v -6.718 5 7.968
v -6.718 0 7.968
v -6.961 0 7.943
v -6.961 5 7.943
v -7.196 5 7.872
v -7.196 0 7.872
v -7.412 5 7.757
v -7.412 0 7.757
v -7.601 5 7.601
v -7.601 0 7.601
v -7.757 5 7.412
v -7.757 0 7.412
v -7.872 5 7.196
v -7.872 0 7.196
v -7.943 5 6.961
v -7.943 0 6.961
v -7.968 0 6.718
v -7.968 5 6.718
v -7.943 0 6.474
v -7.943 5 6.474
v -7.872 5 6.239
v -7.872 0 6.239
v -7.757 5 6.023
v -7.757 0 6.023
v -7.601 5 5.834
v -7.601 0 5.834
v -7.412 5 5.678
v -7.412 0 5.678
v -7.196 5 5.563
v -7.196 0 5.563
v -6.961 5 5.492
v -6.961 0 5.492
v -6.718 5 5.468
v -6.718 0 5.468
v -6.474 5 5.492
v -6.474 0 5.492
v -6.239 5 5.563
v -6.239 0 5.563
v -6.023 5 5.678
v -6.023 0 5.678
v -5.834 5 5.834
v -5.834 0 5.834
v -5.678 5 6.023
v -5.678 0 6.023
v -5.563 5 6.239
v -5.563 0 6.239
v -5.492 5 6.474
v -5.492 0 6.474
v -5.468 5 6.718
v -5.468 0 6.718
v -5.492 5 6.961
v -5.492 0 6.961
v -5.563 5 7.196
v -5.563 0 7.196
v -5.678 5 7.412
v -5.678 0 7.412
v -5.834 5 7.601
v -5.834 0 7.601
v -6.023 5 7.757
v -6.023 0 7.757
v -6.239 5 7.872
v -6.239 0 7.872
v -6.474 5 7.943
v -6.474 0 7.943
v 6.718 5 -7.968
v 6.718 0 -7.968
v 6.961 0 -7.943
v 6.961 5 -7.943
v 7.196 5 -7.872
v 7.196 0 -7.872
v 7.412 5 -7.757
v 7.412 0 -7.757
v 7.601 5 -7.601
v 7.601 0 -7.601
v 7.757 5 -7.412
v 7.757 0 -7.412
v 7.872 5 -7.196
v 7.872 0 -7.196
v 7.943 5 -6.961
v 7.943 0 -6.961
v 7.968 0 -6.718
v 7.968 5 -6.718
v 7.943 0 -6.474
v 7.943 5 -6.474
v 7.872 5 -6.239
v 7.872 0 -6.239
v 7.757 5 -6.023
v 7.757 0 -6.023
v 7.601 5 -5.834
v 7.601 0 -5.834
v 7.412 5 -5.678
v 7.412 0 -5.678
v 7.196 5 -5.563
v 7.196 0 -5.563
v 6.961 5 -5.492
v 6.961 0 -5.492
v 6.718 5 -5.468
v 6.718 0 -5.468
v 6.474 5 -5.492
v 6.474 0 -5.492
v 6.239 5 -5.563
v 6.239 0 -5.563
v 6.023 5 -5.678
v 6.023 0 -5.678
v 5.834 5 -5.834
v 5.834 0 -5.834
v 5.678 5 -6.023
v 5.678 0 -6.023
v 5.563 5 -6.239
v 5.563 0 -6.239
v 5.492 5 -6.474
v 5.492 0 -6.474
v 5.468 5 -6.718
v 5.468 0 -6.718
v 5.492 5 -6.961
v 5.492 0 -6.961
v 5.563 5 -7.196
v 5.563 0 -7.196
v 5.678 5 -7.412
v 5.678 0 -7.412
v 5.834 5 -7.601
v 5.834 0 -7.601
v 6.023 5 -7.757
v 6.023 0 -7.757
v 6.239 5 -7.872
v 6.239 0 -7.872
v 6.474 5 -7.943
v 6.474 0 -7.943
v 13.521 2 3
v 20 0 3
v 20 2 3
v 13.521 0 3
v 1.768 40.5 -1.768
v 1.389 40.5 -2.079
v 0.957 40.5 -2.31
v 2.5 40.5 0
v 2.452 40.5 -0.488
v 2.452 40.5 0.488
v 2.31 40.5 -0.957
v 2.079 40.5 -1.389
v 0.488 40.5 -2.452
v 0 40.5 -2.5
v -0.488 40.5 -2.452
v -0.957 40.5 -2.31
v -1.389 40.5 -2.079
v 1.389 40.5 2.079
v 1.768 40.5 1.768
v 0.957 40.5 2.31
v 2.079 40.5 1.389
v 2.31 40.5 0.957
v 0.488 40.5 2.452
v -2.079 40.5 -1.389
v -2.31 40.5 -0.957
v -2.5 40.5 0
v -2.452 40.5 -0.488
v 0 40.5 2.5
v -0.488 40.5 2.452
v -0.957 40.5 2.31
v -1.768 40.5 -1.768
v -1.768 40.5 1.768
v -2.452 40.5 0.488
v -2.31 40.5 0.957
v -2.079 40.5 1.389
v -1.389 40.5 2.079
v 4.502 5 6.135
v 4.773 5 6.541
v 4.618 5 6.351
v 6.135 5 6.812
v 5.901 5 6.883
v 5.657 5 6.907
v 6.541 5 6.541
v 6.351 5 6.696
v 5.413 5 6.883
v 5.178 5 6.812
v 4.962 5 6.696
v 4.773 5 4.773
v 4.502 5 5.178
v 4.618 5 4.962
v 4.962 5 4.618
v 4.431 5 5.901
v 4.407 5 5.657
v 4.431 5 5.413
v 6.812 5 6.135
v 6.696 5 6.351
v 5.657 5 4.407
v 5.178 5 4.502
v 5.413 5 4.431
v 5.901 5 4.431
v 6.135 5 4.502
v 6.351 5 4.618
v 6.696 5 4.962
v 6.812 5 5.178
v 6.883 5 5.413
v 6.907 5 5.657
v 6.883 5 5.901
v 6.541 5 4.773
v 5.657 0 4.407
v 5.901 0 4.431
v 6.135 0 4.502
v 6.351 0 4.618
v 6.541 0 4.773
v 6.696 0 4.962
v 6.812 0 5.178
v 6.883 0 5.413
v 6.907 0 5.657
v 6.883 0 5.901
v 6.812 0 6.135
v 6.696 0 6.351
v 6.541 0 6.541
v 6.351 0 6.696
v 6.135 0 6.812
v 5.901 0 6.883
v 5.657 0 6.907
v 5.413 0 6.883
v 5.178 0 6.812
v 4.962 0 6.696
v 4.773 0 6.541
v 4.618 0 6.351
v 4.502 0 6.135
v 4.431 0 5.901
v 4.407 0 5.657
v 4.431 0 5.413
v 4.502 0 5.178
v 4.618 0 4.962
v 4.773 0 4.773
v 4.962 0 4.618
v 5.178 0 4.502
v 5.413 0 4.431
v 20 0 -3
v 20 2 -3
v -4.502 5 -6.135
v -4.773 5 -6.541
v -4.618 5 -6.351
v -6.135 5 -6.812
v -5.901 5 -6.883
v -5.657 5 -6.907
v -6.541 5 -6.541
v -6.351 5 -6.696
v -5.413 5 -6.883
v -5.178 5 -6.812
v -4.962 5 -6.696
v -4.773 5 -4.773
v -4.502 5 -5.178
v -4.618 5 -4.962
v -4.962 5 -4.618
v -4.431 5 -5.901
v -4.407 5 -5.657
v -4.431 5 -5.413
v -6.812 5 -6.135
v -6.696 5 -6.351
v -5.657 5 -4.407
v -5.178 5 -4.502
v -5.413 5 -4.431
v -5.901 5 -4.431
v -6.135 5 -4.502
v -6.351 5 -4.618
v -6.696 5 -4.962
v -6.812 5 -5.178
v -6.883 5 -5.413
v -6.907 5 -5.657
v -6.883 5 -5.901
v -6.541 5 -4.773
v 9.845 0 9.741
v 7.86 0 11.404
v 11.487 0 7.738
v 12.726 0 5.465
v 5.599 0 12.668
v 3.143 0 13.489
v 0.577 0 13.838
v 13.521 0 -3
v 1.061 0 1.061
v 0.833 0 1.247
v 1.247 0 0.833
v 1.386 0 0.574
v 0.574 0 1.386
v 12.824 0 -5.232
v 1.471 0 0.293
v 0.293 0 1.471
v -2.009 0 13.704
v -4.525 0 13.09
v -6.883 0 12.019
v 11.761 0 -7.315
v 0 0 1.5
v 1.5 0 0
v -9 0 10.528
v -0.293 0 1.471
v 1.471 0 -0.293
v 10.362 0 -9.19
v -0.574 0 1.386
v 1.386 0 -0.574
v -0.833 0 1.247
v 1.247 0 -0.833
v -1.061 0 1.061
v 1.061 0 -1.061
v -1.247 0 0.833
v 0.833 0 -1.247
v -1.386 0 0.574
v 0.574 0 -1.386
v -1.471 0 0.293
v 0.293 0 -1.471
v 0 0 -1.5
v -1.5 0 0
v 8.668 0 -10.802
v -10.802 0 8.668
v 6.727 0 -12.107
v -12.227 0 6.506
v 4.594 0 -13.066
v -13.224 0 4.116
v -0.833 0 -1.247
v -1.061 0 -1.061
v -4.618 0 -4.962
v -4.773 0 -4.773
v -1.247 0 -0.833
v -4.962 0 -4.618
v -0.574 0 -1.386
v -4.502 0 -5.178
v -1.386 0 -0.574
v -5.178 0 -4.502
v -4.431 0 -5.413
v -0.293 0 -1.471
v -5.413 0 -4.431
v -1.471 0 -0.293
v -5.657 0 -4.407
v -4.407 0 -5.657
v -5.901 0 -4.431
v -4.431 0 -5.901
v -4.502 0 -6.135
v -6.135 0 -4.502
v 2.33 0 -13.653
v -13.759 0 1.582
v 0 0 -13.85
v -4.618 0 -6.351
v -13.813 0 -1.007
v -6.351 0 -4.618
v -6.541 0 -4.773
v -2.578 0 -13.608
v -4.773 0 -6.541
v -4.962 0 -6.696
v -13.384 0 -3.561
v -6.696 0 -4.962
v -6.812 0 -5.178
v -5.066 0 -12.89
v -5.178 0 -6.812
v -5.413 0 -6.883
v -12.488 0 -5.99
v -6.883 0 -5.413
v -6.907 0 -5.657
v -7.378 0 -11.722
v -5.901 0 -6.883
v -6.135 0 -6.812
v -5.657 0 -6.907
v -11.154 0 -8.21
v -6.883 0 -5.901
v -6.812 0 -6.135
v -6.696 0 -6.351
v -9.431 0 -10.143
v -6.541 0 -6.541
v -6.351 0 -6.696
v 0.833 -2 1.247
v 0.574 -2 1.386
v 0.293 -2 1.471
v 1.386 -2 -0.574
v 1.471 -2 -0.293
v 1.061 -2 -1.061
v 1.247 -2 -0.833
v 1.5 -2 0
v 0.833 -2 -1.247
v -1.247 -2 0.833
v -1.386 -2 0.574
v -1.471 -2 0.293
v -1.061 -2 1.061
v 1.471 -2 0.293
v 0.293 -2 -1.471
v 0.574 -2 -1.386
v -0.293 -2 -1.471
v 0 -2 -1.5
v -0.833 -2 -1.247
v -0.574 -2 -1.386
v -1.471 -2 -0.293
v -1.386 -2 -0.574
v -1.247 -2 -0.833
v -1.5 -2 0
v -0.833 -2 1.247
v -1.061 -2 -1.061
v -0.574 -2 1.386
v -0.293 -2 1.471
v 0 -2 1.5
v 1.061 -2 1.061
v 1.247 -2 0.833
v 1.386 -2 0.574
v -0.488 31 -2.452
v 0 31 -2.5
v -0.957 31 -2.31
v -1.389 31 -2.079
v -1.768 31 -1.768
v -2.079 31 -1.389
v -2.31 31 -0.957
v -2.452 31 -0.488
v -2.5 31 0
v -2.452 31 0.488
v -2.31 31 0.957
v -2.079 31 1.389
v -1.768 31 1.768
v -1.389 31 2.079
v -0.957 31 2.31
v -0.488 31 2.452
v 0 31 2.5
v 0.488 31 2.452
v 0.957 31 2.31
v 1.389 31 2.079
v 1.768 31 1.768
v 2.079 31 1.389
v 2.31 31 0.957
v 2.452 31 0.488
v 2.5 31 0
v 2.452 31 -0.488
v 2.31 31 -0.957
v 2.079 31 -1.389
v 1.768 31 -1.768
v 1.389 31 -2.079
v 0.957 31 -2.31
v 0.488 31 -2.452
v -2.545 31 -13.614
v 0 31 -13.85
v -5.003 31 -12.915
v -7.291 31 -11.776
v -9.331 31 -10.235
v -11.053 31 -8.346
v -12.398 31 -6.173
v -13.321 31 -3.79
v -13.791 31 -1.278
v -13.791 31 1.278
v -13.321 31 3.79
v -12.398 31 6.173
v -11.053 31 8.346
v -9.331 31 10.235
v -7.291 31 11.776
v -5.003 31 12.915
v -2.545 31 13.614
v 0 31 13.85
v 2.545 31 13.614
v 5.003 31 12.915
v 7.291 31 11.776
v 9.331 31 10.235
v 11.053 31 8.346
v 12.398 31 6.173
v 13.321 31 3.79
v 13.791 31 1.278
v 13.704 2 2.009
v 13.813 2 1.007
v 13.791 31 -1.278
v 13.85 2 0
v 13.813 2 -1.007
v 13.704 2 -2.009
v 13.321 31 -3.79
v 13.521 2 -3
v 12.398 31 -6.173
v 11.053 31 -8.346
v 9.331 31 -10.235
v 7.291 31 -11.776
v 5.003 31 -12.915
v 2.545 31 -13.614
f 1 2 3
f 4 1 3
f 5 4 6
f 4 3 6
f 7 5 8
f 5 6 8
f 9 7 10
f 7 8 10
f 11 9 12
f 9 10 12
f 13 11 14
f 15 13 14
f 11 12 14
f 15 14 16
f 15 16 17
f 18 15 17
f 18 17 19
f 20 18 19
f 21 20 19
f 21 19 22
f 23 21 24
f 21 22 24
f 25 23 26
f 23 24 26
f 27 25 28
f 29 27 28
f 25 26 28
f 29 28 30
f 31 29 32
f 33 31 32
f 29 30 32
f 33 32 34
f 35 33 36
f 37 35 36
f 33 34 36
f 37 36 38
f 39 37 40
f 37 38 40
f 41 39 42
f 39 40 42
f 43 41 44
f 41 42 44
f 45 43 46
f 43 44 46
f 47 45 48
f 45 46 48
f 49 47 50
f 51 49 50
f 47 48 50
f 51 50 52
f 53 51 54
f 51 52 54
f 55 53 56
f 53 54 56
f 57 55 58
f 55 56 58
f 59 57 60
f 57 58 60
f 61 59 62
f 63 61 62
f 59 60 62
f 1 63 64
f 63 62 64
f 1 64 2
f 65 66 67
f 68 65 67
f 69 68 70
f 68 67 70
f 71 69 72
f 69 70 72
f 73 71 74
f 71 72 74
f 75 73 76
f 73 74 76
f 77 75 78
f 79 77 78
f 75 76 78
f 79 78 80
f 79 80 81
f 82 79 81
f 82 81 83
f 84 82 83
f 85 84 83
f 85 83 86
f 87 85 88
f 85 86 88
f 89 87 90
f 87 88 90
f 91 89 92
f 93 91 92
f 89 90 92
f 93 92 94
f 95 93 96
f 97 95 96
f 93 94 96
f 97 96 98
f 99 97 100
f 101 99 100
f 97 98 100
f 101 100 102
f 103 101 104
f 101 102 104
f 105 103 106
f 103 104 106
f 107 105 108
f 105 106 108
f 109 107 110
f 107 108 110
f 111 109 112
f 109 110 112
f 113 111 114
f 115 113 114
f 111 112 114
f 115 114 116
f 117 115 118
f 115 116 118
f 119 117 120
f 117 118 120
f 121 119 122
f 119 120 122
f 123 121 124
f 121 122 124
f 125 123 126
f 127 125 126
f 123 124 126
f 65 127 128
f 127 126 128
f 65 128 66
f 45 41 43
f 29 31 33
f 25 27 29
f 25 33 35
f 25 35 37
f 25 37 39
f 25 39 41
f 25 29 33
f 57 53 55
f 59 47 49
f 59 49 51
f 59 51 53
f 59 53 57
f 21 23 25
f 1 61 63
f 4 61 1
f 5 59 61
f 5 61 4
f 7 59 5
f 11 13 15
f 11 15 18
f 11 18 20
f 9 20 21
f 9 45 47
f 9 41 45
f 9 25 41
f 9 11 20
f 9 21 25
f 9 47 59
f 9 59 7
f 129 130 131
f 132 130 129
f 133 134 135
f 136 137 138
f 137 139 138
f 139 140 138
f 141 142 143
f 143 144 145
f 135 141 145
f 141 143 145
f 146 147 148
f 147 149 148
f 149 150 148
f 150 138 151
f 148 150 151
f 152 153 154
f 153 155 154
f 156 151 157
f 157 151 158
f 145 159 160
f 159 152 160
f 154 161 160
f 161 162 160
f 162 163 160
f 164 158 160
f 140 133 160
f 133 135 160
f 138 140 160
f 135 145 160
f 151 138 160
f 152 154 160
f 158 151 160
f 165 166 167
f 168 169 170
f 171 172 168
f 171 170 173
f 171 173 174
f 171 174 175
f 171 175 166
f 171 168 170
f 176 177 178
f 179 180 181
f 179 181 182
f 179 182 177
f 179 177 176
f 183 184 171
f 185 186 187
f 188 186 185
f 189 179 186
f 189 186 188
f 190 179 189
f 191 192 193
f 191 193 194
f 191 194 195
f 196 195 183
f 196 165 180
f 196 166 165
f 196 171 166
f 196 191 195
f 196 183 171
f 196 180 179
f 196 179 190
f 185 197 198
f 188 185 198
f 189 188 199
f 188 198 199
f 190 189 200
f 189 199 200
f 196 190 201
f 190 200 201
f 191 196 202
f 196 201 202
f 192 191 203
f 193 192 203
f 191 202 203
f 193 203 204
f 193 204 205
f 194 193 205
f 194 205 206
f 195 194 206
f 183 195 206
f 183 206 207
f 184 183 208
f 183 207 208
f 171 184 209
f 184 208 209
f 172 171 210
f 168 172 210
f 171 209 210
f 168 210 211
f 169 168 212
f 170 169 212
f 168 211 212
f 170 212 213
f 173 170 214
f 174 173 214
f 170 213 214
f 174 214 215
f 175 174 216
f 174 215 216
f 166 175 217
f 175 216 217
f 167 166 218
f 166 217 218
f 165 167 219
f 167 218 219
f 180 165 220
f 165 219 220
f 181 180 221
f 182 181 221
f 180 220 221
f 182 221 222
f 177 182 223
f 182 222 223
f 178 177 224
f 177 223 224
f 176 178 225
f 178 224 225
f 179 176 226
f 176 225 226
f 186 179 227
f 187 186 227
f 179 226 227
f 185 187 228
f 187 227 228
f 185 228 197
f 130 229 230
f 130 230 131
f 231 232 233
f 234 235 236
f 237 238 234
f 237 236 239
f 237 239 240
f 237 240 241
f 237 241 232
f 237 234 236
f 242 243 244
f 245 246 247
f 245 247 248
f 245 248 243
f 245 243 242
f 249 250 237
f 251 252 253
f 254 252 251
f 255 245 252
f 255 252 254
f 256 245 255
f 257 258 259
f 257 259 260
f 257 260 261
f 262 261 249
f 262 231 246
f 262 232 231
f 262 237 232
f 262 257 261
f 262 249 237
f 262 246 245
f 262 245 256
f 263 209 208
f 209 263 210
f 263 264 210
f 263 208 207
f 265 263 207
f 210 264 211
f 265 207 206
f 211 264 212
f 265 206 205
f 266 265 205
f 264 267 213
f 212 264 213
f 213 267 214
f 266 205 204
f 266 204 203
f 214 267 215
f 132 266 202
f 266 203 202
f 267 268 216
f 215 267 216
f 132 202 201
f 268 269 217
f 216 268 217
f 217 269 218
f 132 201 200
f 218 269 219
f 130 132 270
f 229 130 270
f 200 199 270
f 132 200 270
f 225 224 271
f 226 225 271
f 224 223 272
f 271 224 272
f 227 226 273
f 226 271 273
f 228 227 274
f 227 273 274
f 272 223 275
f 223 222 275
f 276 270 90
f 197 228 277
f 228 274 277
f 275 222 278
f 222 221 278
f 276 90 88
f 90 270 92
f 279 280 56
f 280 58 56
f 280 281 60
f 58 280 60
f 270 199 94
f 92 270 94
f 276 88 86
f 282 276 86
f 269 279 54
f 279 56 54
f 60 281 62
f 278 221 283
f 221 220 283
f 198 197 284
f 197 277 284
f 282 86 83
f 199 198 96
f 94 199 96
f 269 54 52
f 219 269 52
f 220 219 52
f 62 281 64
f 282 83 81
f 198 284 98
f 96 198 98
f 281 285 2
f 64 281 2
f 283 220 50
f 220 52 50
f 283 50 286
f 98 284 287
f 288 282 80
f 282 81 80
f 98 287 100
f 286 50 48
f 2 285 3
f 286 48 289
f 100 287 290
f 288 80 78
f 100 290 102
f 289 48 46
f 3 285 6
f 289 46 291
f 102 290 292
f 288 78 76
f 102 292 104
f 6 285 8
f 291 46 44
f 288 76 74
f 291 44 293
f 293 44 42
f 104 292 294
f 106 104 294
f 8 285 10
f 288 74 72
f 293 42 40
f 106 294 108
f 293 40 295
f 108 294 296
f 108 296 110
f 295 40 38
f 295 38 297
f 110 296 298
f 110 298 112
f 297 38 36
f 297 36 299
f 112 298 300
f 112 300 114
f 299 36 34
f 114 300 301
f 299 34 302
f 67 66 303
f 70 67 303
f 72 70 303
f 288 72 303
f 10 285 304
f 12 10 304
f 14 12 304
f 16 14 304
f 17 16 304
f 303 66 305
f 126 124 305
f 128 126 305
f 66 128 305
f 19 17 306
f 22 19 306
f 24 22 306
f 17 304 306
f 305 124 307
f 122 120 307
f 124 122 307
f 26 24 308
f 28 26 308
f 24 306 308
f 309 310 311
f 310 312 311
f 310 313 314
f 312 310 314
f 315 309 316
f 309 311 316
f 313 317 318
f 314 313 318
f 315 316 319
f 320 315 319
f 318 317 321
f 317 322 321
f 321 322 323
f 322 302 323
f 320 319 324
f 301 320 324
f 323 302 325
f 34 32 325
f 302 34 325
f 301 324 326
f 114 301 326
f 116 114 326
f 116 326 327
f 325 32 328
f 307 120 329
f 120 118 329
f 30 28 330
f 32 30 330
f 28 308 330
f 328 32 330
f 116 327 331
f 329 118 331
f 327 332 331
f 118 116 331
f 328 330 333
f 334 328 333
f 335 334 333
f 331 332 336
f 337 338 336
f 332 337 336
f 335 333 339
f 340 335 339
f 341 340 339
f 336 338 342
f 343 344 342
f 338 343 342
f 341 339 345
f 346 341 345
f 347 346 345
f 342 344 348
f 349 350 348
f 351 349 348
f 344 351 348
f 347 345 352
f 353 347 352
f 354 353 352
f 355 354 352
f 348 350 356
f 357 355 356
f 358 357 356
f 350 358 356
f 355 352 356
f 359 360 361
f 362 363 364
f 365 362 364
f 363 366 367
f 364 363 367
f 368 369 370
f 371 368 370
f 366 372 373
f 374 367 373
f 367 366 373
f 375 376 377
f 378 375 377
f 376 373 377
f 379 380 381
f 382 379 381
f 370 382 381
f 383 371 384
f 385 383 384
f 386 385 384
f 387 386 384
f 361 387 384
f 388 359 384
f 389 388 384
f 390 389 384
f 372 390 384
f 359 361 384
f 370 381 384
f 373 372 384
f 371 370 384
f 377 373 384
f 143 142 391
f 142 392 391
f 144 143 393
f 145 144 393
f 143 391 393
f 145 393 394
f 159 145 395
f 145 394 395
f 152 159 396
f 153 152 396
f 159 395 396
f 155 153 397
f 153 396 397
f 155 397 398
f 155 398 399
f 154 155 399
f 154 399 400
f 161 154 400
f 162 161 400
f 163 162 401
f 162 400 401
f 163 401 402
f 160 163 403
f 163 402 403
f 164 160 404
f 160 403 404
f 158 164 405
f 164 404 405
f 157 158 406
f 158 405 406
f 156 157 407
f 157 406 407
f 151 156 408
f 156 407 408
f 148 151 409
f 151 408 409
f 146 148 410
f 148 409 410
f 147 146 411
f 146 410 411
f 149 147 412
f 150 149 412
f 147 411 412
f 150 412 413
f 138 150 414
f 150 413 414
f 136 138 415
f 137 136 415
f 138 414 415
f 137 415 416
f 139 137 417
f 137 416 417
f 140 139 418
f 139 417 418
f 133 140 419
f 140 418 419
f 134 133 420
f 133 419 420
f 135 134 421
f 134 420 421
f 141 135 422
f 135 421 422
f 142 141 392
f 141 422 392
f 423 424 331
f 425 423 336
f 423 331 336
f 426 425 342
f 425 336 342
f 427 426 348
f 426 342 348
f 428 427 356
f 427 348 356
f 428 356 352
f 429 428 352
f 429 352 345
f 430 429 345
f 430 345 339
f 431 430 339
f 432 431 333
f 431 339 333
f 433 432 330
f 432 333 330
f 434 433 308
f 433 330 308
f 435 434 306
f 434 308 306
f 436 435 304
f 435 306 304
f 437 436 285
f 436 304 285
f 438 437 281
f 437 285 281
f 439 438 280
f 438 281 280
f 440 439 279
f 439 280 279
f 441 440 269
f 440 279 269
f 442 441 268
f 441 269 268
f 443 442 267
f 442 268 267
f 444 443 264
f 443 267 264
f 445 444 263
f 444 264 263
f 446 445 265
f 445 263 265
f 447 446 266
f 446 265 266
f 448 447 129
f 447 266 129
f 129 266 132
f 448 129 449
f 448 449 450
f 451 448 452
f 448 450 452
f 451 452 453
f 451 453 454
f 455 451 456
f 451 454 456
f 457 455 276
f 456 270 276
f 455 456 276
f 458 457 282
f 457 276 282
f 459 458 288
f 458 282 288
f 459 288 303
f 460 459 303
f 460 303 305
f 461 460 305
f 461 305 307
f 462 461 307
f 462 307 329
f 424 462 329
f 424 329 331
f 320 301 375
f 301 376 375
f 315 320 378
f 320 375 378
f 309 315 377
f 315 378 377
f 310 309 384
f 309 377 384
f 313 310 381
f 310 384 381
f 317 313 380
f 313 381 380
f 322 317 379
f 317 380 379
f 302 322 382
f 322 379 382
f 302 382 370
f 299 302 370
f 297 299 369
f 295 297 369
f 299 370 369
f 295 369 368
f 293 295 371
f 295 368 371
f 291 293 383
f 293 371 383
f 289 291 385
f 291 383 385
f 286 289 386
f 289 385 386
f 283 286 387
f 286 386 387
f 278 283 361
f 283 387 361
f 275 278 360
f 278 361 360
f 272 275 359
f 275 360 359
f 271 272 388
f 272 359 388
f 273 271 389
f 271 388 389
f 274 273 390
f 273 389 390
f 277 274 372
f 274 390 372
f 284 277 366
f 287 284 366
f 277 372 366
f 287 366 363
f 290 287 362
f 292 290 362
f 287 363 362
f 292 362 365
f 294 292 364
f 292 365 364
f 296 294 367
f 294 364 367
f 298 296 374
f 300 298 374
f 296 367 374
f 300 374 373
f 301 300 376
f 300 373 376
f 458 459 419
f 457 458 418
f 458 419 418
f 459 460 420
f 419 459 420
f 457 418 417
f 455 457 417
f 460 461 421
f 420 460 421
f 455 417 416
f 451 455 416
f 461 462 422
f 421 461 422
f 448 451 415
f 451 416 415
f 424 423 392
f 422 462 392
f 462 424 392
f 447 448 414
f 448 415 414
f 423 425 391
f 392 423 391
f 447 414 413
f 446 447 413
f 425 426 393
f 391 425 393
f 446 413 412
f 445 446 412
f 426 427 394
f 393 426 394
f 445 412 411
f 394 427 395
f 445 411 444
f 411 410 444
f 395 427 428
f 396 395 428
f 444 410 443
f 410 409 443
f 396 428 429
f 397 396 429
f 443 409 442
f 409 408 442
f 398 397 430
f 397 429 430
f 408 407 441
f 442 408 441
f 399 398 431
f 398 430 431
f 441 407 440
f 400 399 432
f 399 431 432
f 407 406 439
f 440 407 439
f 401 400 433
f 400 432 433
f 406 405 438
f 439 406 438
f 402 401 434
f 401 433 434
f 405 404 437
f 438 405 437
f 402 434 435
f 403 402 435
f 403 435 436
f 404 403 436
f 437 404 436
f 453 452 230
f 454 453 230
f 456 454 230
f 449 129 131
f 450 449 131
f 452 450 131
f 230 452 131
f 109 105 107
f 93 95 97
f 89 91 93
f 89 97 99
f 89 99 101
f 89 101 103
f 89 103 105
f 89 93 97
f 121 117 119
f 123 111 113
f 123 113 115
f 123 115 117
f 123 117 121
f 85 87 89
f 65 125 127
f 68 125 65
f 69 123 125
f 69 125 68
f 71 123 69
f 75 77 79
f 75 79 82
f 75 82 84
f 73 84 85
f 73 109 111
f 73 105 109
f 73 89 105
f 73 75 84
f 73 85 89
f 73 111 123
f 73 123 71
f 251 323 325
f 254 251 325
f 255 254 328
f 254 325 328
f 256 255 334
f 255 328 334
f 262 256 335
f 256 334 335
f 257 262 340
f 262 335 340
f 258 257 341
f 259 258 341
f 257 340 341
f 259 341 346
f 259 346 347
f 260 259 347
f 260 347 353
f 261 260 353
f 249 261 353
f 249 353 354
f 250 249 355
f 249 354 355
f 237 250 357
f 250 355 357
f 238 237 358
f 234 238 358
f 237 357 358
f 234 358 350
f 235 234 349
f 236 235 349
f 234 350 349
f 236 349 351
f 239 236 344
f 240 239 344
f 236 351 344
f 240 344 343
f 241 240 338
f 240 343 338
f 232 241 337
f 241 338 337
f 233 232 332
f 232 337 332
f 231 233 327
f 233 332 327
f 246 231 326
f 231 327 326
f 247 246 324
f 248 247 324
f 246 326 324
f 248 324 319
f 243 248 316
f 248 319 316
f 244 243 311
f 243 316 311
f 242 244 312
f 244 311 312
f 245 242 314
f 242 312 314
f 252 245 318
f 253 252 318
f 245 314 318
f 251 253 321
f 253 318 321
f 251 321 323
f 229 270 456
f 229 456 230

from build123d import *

# Parameters (mm, degrees)
SKETCH_3_R          = 1.25
CUT_EXTRUDE_1_DEPTH = 5
EXTRUDE_1_DEPTH     = 2


with BuildPart() as part:
    # Эскиз2 → Повернуть1 (revolve)
    with BuildSketch(Plane(origin=(0, 0, 0), x_dir=(0, 0, -1), z_dir=(1, 0, 0))):
        Polygon((0, 0), (0, 31), (0, 40.5), (2.5, 40.5), (2.5, 31), (13.85, 31), (13.85, 0), (1.5, 0), (1.5, -2), (0, -2), align=None)
    revolve(axis=Axis((0, 0, 0), (0, 1, 0)))

    # Эскиз3 → Вырез-Вытянуть1 (cut)
    with BuildSketch(Plane.XZ):
        with Locations(Location((5.65685425, 5.65685425, 0), (0, 0, 270))):
            Circle(SKETCH_3_R)
        with Locations(Location((6.717514421, -6.717514421, 0), (0, 0, 270))):
            Circle(SKETCH_3_R)
        with Locations(Location((-6.717514421, 6.717514421, 0), (0, 0, 90))):
            Circle(SKETCH_3_R)
        with Locations(Location((-5.65685425, -5.65685425, 0), (0, 0, 90))):
            Circle(SKETCH_3_R)
    extrude(amount=-CUT_EXTRUDE_1_DEPTH, mode=Mode.SUBTRACT)

    # Эскиз4 → Бобышка-Вытянуть1 (add)
    with BuildSketch(Plane.XZ):
        with BuildLine():
            Line((13.521187078, -3), (13.85, -3))
            Line((13.85, -3), (20, -3))
            Line((20, -3), (20, 3))
            Line((20, 3), (13.521187078, 3))
            ThreePointArc((13.521187078, 3), (13.767551362, 1.50898293), (13.85, 0))
            ThreePointArc((13.85, 0), (13.767551362, -1.50898293), (13.521187078, -3))
        make_face()
    extrude(amount=-EXTRUDE_1_DEPTH)


solid = part.part
